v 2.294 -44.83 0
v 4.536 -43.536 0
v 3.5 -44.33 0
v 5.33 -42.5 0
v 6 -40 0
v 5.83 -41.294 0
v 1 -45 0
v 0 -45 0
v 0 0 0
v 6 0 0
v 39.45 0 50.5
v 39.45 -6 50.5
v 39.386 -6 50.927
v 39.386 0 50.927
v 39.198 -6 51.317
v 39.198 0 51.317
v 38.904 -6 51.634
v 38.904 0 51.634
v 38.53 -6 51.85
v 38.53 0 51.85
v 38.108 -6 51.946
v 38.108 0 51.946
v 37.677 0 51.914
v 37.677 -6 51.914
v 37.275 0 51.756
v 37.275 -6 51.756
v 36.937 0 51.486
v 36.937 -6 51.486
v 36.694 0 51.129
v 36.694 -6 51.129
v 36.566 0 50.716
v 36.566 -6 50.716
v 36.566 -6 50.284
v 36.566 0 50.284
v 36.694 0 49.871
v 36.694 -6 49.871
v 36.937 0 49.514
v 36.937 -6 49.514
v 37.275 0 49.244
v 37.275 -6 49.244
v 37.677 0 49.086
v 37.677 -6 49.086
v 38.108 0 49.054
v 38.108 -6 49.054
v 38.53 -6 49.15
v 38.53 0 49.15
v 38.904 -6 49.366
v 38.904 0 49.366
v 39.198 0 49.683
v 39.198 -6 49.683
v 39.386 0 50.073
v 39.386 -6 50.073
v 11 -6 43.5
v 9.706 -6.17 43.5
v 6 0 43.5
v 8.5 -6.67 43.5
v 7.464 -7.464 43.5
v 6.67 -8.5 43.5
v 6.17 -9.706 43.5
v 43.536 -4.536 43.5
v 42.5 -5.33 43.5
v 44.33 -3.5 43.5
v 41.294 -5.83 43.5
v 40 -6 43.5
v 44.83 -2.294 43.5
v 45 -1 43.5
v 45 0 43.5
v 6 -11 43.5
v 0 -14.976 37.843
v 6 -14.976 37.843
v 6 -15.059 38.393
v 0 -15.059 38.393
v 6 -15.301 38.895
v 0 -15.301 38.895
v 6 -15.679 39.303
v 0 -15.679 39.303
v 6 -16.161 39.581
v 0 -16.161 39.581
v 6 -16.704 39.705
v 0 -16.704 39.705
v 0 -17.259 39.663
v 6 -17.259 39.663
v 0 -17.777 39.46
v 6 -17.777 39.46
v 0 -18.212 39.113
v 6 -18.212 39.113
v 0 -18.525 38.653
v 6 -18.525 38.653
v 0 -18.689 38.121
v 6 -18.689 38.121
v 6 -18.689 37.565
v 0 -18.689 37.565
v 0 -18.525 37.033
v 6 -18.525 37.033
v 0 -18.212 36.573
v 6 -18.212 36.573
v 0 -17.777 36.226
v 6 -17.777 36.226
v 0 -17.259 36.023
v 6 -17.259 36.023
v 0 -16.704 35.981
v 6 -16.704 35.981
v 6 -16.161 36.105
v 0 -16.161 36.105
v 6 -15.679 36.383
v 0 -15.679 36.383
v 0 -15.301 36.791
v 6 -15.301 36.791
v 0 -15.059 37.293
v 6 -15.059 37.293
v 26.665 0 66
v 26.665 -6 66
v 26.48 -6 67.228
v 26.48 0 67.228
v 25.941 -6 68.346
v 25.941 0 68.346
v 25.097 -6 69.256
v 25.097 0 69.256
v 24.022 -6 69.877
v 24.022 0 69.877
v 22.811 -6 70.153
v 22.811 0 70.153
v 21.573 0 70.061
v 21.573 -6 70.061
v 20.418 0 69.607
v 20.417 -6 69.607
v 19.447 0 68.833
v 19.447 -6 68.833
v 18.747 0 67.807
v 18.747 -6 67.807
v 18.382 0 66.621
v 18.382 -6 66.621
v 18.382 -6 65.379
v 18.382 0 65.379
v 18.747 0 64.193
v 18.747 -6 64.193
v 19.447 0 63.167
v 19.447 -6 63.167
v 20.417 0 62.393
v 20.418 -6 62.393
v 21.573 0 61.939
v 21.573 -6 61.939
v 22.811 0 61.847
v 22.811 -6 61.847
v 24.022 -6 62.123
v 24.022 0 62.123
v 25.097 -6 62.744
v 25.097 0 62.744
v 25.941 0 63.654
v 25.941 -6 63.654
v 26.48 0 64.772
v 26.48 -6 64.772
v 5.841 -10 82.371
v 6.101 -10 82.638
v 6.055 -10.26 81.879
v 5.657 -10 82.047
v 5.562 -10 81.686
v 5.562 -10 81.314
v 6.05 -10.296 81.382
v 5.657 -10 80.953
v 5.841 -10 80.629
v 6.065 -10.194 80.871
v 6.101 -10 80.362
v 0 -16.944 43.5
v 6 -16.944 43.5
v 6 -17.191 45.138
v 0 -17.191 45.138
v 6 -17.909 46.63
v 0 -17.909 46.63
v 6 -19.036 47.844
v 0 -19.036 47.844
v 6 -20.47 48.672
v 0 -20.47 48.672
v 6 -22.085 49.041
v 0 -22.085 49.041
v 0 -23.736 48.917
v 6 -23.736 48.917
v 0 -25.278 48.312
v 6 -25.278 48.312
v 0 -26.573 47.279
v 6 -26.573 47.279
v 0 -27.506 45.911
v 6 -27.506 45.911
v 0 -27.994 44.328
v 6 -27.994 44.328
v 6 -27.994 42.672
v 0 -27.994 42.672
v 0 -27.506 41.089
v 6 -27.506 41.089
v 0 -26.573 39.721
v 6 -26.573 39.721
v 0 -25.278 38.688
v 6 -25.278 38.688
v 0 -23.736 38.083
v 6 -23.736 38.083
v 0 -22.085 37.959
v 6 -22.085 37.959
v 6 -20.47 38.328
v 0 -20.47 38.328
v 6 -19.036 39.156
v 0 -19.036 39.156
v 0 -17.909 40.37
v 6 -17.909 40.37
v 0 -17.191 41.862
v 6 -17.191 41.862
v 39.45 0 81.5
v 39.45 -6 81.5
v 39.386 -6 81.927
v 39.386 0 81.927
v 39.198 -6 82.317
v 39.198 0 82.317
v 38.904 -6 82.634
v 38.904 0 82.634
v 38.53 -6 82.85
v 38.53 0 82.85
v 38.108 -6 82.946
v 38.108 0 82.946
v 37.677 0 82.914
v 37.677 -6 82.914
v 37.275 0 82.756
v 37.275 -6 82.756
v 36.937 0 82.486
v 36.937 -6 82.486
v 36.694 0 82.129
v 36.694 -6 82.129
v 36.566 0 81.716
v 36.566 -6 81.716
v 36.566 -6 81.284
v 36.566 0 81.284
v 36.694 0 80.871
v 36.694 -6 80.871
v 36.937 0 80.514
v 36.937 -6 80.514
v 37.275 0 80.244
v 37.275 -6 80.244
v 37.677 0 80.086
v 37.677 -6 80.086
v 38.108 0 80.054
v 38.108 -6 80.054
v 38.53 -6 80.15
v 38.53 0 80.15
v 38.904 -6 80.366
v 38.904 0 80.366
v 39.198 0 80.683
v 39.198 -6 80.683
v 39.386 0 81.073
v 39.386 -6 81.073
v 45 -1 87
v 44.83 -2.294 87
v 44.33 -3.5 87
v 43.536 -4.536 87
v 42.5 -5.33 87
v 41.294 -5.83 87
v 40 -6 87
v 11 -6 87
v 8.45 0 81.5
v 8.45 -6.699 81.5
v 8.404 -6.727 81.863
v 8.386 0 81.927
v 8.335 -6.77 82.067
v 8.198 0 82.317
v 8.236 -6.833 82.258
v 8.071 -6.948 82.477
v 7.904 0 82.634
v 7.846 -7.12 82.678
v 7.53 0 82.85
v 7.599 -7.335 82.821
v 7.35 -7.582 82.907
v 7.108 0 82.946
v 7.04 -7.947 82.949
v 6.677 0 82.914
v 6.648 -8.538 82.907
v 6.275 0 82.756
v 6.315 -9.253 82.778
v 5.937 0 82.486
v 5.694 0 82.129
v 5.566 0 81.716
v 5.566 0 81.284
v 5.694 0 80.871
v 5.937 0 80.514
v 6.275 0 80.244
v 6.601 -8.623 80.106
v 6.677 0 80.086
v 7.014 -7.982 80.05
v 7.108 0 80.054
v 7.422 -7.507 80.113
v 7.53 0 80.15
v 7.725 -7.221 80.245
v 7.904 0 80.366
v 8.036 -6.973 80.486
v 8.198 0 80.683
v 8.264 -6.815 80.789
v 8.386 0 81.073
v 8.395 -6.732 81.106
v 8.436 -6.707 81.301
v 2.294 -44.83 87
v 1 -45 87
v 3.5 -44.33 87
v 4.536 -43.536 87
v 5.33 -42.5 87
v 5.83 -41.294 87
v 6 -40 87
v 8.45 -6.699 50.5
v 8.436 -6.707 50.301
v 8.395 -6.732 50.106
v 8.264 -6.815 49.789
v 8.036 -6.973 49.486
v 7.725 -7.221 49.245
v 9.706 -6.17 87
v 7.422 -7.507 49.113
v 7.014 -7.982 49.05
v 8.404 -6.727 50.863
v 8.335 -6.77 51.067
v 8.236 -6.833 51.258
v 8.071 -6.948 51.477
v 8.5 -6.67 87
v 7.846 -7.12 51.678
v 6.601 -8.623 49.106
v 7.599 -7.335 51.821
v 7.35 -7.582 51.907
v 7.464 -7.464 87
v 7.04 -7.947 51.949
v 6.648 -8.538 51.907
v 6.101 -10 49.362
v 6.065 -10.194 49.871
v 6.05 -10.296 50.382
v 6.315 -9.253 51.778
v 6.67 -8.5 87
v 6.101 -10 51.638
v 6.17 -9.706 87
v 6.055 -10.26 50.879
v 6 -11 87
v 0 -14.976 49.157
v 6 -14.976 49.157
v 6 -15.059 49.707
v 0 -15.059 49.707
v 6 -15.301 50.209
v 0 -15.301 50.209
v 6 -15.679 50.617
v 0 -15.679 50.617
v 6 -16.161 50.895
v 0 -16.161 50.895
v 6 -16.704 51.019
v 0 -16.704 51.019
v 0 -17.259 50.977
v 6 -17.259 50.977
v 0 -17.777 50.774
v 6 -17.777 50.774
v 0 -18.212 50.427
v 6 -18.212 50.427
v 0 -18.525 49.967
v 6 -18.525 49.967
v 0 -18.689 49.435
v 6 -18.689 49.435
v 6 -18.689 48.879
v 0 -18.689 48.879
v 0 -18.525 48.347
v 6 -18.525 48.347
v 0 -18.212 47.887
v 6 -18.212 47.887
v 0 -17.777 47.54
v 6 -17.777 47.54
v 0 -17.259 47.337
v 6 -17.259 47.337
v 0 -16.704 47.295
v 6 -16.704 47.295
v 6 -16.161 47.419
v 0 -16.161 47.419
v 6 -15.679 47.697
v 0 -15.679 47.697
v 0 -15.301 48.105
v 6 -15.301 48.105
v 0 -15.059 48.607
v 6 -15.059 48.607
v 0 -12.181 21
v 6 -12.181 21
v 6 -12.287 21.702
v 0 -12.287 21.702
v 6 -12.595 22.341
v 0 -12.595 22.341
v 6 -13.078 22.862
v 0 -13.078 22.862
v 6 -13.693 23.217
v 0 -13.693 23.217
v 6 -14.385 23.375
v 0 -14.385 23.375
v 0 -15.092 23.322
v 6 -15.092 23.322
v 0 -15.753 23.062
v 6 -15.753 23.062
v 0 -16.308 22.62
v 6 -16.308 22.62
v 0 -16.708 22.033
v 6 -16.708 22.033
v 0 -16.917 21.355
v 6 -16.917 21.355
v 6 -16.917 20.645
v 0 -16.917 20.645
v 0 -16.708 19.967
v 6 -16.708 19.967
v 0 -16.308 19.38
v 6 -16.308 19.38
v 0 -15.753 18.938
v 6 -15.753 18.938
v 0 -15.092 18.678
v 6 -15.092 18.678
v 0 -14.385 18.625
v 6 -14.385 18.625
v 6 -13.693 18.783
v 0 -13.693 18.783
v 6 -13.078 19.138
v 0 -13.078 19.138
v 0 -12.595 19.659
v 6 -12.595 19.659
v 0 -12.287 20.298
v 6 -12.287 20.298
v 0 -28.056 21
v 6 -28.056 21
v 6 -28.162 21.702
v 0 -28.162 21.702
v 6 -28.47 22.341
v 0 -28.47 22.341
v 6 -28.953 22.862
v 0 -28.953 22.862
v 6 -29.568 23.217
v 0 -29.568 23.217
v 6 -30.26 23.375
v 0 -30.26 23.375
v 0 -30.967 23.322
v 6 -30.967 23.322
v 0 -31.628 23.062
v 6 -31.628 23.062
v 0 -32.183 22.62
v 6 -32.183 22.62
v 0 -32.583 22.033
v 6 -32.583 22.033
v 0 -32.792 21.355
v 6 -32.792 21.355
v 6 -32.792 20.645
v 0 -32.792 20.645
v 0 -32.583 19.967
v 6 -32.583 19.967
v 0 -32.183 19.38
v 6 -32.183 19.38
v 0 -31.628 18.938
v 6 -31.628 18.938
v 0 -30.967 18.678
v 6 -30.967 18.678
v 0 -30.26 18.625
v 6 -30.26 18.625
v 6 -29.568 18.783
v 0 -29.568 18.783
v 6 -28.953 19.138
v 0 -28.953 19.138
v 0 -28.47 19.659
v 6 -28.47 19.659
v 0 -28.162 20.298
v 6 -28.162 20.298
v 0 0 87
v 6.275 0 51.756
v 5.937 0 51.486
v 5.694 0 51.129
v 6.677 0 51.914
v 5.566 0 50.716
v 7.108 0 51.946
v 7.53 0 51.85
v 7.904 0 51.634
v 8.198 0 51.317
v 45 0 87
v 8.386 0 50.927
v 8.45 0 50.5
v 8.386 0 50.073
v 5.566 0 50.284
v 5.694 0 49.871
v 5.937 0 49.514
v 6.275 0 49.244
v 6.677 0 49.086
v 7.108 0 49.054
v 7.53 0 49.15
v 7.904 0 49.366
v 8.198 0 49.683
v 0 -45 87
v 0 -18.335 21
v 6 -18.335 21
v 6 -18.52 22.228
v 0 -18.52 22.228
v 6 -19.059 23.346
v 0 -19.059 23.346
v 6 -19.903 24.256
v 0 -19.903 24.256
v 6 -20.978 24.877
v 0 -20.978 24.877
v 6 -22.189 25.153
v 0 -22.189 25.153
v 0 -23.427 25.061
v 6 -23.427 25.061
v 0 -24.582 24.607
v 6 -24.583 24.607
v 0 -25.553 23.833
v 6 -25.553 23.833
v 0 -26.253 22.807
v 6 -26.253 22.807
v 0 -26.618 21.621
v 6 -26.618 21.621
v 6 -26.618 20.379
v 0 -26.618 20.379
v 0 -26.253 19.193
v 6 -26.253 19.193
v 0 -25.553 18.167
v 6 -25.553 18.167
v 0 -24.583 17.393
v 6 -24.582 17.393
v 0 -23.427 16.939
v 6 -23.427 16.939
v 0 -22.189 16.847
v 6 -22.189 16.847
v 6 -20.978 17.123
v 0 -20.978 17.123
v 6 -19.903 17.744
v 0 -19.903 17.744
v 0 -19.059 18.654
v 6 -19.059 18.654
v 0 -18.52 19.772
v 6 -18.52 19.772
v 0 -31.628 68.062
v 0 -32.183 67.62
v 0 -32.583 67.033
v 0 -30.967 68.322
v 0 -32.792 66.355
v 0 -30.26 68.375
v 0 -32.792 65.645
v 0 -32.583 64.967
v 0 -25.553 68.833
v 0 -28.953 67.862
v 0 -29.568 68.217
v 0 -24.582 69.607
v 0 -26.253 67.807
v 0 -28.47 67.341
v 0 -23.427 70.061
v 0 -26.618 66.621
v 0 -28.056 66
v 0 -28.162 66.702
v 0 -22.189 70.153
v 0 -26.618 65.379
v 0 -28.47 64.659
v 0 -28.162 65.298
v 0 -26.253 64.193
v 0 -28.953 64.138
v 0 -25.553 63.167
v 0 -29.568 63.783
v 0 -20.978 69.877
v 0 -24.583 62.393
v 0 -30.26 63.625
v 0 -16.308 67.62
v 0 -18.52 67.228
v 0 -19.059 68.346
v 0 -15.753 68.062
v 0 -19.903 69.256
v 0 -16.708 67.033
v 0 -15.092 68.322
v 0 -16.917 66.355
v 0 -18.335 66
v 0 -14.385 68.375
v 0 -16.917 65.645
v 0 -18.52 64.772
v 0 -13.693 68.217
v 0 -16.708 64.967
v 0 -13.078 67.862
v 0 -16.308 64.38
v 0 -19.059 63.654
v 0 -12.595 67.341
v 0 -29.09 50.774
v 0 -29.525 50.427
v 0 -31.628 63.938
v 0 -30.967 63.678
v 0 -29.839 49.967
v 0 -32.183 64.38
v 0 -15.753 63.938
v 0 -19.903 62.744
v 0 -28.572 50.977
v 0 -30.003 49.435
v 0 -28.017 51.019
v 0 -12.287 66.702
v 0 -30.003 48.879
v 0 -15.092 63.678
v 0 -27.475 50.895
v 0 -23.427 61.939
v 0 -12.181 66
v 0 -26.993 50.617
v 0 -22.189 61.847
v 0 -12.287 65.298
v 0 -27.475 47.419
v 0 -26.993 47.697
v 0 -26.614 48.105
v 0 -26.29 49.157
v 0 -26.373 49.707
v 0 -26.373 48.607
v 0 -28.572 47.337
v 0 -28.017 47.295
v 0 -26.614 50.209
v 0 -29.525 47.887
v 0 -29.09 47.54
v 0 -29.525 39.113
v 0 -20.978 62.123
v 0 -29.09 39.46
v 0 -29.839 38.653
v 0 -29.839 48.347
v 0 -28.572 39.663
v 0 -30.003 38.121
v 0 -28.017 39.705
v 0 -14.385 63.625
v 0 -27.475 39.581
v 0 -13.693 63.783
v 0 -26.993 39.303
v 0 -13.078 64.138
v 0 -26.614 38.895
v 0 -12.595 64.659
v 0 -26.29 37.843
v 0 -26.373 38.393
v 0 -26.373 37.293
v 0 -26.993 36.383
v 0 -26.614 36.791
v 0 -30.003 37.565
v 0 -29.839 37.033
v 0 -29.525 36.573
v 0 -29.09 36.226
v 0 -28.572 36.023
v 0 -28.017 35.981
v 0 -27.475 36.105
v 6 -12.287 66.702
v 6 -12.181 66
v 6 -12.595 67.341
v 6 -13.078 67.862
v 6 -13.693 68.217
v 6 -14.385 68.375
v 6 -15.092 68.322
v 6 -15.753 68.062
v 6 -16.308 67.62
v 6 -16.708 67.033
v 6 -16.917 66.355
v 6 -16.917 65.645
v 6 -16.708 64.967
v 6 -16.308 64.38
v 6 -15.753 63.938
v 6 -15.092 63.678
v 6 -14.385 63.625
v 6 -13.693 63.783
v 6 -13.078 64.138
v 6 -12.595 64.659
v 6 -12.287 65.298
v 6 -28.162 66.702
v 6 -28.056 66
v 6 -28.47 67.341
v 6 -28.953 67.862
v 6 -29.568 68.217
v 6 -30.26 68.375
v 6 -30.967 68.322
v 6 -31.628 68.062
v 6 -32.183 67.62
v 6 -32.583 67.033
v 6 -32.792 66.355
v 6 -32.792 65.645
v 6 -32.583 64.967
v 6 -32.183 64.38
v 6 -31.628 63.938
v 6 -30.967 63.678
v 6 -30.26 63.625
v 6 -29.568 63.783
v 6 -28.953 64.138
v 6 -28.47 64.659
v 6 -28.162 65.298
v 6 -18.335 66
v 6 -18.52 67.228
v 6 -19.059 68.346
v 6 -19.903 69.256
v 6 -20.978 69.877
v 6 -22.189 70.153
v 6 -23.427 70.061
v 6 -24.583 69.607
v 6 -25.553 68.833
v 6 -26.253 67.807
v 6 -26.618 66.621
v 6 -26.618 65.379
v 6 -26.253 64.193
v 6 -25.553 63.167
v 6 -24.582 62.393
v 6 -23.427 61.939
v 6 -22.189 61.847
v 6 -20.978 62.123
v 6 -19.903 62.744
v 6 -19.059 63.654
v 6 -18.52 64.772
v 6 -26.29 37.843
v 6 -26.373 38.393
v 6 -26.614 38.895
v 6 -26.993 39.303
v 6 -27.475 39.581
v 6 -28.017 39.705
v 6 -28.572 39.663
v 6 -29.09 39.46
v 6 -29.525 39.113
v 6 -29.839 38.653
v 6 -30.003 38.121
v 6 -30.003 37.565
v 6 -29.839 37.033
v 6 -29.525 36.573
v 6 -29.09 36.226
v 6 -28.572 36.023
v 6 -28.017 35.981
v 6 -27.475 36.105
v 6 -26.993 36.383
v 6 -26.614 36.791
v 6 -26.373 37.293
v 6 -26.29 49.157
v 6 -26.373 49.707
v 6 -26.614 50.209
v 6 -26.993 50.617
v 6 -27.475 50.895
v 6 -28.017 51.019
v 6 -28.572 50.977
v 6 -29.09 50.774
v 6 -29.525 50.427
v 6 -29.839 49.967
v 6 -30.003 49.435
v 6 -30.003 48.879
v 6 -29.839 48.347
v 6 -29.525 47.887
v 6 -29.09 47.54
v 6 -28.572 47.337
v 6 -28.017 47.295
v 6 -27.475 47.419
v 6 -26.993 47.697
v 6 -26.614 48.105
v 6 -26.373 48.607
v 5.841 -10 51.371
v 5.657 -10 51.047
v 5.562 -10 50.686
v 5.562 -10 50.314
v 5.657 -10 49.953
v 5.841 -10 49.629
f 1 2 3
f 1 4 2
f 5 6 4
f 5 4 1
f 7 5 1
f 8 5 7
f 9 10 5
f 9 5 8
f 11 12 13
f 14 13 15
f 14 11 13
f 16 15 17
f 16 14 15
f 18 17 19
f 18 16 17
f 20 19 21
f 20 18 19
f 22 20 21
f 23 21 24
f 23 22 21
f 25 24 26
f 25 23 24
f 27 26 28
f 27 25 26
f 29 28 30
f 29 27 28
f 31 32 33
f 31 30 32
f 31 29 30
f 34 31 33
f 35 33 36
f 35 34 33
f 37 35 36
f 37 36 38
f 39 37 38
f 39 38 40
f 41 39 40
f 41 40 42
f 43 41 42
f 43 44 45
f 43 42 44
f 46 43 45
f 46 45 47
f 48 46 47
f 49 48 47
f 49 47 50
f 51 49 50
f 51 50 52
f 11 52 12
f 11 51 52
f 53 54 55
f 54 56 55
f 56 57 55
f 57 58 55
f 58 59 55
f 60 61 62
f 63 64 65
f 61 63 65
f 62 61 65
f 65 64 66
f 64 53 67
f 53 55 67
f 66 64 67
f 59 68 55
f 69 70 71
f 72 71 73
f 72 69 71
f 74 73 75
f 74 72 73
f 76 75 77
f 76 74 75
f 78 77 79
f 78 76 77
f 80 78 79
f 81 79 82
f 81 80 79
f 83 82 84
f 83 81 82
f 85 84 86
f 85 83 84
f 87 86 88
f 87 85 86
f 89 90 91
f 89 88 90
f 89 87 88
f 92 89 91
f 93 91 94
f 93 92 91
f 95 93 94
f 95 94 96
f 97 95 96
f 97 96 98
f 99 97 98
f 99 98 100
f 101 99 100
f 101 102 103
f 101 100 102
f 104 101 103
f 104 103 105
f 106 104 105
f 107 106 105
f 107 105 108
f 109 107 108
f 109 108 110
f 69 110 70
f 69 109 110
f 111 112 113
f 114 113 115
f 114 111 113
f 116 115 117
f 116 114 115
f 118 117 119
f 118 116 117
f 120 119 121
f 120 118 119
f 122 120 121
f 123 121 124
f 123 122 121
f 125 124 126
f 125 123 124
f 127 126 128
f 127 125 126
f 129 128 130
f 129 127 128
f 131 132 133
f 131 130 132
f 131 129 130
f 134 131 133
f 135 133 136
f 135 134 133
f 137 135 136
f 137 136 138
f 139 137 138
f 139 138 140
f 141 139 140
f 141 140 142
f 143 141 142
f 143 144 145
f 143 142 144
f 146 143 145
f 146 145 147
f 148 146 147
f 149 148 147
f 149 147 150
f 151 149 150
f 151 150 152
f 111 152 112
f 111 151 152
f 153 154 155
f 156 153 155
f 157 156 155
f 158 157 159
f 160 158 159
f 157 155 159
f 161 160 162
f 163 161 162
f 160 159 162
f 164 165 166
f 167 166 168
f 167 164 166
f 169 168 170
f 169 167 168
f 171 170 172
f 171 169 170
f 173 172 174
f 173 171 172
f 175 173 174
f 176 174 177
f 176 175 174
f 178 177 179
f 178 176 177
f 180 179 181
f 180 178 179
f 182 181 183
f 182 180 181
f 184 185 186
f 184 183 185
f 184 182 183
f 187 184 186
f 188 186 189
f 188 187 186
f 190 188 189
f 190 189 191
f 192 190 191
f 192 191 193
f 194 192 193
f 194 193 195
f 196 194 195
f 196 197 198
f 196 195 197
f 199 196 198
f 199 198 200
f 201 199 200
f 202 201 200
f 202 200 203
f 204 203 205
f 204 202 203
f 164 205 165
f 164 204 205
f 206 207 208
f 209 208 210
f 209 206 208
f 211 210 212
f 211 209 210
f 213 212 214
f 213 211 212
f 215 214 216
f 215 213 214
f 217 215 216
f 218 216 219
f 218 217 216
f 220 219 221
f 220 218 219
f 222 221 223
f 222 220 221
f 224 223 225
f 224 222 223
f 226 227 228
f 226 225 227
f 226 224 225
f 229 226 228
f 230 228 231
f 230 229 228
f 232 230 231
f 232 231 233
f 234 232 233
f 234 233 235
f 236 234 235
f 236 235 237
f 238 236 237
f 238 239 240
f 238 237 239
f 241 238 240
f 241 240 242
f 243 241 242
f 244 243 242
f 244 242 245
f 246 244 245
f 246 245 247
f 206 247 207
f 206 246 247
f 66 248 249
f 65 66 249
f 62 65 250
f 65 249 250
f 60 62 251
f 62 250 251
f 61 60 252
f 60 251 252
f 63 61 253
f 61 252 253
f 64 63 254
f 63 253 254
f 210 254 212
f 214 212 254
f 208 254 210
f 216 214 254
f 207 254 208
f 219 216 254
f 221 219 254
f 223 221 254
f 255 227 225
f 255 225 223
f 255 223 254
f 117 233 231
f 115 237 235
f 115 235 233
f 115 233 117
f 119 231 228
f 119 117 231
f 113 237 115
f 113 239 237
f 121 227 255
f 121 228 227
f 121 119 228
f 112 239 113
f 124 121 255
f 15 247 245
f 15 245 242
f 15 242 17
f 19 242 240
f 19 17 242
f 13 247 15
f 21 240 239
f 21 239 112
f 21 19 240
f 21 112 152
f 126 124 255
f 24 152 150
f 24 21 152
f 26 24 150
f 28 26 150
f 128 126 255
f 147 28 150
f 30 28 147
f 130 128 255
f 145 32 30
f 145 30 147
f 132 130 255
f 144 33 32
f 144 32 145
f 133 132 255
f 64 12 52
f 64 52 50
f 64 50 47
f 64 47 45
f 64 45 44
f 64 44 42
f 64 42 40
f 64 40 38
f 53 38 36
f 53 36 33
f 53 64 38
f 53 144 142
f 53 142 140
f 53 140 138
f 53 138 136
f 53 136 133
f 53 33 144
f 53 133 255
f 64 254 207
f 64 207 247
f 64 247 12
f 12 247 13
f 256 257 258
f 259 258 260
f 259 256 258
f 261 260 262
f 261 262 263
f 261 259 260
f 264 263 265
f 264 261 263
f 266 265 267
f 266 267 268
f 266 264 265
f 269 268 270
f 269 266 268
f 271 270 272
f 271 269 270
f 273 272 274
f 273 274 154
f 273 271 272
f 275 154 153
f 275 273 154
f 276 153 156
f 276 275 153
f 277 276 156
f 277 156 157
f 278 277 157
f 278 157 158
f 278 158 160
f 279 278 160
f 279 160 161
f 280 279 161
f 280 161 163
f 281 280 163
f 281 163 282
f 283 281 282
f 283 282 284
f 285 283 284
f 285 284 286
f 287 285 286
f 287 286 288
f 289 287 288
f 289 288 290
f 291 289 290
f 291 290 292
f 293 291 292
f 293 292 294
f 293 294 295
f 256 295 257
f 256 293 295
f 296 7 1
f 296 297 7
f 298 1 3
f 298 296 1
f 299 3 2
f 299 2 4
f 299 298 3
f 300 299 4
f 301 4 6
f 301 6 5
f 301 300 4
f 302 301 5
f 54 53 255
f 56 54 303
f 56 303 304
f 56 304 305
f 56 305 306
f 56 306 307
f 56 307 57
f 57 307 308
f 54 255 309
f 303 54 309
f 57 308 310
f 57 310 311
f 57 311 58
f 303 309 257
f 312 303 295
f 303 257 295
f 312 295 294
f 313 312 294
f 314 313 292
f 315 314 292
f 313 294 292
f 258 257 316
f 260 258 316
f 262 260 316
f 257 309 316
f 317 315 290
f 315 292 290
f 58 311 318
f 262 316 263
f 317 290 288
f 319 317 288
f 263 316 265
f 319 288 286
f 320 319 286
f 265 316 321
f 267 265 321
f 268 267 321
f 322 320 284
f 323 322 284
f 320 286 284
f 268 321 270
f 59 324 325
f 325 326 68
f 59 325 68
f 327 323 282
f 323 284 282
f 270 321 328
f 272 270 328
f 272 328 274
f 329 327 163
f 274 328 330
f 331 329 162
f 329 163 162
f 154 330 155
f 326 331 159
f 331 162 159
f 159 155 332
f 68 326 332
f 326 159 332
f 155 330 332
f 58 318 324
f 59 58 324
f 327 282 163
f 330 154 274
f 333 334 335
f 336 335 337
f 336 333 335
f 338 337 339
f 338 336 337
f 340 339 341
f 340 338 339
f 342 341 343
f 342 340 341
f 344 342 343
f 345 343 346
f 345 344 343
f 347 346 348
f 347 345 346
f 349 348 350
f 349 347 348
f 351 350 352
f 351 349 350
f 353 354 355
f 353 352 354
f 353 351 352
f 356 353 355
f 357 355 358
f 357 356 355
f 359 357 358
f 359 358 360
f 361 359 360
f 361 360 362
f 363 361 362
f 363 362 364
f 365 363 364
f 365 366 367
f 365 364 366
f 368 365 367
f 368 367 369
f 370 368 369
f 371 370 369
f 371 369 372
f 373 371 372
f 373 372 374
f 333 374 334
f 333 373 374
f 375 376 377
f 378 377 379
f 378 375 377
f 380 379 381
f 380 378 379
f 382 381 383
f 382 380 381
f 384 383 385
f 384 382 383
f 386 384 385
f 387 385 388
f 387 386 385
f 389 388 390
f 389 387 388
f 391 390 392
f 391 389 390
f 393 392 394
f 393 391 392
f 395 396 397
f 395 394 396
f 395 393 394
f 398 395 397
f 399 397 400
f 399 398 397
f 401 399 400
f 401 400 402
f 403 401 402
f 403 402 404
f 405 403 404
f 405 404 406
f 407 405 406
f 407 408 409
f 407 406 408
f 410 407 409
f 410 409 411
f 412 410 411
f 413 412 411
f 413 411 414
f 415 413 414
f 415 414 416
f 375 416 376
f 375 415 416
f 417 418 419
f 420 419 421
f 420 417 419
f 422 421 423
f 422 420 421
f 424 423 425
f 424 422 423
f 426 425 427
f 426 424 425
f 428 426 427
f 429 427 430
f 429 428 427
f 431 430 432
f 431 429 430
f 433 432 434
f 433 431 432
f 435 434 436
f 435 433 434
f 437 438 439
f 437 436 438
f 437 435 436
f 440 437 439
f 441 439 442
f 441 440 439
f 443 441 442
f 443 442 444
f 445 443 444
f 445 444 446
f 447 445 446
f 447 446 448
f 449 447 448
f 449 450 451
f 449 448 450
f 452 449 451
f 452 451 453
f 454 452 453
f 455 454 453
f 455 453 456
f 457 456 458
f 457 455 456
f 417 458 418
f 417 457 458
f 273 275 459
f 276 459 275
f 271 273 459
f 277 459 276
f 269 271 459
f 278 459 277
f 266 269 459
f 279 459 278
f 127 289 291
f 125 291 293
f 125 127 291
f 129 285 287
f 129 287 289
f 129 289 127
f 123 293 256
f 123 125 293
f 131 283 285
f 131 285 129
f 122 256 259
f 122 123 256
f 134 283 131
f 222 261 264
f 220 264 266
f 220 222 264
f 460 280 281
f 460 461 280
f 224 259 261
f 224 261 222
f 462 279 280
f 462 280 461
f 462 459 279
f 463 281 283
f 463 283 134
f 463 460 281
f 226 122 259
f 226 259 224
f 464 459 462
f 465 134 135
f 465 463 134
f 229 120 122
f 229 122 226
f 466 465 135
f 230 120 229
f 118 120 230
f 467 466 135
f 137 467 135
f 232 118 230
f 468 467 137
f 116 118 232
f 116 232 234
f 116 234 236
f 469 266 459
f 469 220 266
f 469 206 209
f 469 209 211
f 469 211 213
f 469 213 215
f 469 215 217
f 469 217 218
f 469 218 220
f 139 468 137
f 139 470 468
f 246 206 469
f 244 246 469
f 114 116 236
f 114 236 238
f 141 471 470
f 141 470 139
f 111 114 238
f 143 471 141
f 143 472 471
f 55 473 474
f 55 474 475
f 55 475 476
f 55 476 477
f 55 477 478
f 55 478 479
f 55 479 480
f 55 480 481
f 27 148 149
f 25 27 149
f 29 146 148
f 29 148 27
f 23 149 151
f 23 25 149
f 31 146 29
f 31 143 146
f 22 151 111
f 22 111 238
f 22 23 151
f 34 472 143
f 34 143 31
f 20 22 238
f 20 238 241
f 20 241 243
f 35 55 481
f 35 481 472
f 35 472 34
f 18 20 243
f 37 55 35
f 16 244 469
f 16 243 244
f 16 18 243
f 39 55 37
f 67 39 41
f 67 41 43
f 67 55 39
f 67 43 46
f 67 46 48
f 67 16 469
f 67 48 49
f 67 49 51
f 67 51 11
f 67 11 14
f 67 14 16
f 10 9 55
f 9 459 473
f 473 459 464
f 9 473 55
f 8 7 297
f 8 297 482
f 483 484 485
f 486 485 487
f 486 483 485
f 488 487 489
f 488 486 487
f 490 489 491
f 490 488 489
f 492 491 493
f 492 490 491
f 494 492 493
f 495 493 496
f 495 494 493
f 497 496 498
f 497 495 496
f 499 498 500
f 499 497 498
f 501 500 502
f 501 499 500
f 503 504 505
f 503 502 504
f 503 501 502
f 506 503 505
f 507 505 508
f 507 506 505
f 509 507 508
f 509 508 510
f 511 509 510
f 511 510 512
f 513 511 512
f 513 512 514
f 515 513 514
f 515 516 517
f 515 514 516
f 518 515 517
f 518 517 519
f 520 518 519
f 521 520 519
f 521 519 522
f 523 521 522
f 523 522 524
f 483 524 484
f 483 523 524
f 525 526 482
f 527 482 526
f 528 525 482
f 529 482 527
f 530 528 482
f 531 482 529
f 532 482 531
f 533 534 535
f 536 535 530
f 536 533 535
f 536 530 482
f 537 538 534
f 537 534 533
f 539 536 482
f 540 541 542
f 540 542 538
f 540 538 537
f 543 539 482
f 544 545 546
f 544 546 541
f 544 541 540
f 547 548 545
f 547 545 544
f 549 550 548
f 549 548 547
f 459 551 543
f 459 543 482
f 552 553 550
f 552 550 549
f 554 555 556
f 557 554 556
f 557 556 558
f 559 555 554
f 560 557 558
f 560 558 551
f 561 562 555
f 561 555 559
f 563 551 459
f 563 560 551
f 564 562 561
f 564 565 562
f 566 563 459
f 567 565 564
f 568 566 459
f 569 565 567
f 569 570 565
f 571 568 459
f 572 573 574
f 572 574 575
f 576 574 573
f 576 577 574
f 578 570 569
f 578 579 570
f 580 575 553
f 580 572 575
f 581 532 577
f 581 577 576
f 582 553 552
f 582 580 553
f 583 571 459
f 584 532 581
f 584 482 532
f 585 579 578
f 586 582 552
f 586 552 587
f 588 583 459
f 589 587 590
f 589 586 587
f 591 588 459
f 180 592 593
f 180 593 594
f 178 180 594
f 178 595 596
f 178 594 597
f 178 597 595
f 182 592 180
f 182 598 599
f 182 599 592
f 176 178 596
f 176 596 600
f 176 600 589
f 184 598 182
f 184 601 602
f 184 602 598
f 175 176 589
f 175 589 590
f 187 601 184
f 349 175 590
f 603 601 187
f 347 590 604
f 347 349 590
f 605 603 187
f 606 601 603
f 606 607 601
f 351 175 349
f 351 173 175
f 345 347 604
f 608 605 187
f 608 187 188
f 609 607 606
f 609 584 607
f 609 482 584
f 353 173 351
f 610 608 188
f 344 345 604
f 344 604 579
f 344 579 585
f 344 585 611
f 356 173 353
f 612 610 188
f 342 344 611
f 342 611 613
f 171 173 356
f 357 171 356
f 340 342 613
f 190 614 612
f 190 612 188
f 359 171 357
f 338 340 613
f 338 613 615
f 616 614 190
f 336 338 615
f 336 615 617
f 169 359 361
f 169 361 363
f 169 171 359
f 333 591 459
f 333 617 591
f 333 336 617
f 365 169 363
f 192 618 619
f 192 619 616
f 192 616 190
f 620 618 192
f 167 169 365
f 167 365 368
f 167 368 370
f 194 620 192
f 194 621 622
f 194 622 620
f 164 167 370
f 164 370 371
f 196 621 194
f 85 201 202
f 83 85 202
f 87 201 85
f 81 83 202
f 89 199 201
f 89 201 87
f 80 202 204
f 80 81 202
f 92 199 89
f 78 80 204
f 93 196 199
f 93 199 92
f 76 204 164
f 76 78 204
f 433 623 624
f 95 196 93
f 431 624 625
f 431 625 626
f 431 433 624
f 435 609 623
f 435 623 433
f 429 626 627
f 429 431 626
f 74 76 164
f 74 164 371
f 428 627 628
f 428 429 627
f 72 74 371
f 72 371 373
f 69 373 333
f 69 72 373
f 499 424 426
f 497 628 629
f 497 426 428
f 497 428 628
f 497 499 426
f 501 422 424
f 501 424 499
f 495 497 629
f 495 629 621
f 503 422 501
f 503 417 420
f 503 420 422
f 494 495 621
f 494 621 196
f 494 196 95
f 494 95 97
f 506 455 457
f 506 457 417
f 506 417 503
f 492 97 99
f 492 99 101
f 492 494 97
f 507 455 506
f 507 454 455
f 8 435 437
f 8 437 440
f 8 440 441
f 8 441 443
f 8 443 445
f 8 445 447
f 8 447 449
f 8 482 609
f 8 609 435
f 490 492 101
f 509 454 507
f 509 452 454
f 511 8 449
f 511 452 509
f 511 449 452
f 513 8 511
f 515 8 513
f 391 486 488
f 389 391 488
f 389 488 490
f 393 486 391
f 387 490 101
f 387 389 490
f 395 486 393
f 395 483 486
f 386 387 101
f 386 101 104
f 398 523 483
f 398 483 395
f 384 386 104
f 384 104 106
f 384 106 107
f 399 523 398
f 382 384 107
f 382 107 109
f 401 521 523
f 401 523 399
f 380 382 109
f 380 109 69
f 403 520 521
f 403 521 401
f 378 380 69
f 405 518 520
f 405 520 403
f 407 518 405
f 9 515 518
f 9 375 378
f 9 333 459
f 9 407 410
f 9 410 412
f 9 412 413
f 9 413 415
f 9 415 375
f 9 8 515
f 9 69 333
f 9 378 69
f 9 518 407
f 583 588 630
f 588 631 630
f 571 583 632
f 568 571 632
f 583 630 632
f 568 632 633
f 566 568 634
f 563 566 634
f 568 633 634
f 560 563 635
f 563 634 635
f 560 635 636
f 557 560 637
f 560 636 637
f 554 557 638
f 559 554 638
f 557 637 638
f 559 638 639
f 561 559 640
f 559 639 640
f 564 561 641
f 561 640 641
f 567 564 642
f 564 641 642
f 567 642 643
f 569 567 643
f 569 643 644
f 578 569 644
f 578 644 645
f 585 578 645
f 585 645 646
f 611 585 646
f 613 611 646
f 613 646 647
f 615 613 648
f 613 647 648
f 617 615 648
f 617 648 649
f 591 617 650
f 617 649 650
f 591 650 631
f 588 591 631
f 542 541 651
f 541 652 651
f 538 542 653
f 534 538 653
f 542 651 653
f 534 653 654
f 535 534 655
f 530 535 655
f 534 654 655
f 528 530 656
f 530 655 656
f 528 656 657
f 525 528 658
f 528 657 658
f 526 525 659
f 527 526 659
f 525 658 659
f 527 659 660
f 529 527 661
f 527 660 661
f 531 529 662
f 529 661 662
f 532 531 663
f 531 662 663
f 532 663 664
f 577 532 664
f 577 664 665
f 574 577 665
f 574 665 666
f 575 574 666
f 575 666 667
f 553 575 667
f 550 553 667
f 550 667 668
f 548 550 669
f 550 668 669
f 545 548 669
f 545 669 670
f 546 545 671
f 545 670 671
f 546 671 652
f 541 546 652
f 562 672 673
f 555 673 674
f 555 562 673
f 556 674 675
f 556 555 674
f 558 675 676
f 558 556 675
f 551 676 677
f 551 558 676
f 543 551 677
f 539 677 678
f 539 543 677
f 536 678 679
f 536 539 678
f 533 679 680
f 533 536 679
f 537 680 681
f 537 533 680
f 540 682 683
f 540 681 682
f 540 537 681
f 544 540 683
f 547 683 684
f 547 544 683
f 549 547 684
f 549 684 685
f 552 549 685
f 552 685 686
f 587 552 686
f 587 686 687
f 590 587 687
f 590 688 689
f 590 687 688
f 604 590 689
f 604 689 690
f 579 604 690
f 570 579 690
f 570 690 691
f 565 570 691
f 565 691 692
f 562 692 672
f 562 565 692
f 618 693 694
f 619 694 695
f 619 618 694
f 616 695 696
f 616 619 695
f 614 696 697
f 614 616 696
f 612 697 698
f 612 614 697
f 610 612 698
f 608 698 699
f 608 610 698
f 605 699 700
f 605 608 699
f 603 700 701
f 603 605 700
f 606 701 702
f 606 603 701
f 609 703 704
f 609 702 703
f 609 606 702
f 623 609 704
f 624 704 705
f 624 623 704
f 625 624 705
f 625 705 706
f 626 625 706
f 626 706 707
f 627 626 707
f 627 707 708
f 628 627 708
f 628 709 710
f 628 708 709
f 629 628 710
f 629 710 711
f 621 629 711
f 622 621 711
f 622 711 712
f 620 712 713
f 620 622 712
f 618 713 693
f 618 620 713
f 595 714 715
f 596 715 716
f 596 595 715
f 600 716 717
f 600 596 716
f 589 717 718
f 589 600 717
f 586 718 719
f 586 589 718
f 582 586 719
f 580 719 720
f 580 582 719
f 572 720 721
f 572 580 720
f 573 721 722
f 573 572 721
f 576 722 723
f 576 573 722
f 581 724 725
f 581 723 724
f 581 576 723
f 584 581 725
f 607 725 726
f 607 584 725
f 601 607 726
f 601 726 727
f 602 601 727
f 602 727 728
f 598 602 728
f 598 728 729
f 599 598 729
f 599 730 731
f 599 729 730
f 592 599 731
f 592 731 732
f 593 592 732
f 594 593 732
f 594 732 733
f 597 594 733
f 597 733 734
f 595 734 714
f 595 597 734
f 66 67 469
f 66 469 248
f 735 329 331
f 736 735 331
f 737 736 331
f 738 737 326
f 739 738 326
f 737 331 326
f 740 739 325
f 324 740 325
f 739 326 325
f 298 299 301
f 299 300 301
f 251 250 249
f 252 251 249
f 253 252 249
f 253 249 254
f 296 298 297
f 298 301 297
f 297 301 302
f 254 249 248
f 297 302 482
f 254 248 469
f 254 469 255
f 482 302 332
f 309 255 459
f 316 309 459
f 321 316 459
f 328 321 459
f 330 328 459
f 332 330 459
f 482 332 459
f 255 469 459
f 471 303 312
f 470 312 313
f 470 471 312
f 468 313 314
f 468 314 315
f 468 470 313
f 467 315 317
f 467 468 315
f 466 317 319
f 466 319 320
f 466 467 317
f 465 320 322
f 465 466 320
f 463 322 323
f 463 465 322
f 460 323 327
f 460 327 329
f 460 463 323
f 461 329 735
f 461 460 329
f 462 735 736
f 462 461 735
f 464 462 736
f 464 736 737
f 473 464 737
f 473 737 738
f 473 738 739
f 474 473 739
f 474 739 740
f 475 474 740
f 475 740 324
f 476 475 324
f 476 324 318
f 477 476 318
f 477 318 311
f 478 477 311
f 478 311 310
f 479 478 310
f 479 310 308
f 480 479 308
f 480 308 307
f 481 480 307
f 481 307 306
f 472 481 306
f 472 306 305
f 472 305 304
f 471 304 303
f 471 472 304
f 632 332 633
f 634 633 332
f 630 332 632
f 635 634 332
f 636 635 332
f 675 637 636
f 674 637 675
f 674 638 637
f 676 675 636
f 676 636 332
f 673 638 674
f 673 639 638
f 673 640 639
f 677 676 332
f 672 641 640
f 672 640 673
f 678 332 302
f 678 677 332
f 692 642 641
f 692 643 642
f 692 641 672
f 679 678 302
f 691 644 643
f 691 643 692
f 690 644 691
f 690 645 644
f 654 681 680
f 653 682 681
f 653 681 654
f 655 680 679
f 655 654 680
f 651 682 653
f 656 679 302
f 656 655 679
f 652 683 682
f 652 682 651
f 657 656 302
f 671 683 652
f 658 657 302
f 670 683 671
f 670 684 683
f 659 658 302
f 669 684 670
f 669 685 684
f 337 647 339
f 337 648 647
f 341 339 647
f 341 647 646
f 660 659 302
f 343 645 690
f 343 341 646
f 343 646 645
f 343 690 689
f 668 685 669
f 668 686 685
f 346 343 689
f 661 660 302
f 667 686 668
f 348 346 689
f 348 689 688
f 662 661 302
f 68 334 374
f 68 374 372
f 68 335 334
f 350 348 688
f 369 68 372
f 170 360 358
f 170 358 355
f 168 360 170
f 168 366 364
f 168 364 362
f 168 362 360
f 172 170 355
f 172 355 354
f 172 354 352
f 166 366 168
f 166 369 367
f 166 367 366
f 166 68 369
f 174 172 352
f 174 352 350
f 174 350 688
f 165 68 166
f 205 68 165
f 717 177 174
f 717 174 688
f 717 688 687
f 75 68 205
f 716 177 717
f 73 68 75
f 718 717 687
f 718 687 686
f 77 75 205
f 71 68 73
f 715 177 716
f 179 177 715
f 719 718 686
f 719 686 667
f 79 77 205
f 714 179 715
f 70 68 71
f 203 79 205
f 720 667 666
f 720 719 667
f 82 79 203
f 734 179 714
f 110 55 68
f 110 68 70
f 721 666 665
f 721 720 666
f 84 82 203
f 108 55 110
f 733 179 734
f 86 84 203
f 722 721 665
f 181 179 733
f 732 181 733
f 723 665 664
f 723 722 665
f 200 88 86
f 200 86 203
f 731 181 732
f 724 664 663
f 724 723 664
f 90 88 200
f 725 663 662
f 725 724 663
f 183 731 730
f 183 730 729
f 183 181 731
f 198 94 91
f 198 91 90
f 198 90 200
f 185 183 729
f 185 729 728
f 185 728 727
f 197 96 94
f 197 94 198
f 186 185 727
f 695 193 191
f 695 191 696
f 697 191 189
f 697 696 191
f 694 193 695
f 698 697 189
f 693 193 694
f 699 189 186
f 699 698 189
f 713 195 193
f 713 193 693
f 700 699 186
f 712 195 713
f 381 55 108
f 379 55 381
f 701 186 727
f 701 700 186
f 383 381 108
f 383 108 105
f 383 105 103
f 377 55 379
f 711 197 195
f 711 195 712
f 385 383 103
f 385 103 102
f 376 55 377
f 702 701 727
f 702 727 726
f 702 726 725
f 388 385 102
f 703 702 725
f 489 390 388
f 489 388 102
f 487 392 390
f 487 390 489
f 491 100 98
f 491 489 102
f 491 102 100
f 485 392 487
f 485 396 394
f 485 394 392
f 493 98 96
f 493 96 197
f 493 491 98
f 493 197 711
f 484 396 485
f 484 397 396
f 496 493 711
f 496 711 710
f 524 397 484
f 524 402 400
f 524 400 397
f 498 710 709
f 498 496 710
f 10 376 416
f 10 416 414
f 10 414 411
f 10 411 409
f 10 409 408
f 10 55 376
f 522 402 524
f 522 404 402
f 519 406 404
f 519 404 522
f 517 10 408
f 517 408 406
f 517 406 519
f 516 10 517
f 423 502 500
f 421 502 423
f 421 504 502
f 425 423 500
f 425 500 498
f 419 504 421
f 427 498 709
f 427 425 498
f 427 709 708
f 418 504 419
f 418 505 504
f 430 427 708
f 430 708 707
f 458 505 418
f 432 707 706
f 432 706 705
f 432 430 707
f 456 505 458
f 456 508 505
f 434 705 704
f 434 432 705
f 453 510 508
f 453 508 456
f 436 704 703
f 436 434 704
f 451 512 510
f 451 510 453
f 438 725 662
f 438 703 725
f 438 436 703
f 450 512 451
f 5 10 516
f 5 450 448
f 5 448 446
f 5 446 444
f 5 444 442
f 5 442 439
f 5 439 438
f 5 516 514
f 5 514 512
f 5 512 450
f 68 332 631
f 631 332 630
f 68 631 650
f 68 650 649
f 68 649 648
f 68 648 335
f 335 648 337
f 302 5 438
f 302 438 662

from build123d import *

# Parameters (mm, degrees)
PAD_DEPTH            = 87
SKETCH001_R          = 4.165
POCKET_DEPTH         = 0.001
POCKET_DEPTH_BACK    = 45.001
SKETCH002_R          = 4.165
POCKET001_DEPTH      = 0.001
POCKET001_DEPTH_BACK = 45.001
FILLET_R             = 5
SKETCH004_R          = 2.38125
POCKET002_DEPTH      = 0.001
POCKET002_DEPTH_BACK = 45.001
LINEARPATTERN_COUNT  = 2
LINEARPATTERN_PITCH  = 45
SKETCH005_R          = 5.55625
SKETCH005_R_2        = 1.867
POCKET003_DEPTH      = 0.001
POCKET003_DEPTH_BACK = 45.001
SKETCH006_R          = 1.45
HOLE_DEPTH           = 10
HOLE_TIPS_R          = 1.45
SKETCH007_W          = 60
SKETCH007_H          = 60
POCKET004_DEPTH      = 43.5


with BuildPart() as part:
    # Sketch → Pad (new body)
    with BuildSketch(Plane.XY):
        Polygon((0, 0), (45, 0), (45, -6), (6, -6), (6, -45), (0, -45), align=None)
    extrude(amount=PAD_DEPTH)

    # Sketch001 → Pocket (cut, two sides)
    with BuildSketch(Plane.YZ) as pocket_sk:
        with Locations((-22.5, 21)):
            Circle(SKETCH001_R)
        with Locations((-22.5, 66)):
            Circle(SKETCH001_R)
    extrude(amount=-POCKET_DEPTH, mode=Mode.SUBTRACT)
    extrude(pocket_sk.sketch, amount=POCKET_DEPTH_BACK, mode=Mode.SUBTRACT)

    # Sketch002 → Pocket001 (cut, two sides)
    with BuildSketch(Plane.XZ) as pocket001_sk:
        with Locations((22.5, 66)):
            Circle(SKETCH002_R)
        with Locations((22.5, 21)):
            Circle(SKETCH002_R)
    extrude(amount=-POCKET001_DEPTH, mode=Mode.SUBTRACT)
    extrude(pocket001_sk.sketch, amount=POCKET001_DEPTH_BACK, mode=Mode.SUBTRACT)

    # Fillet
    fillet_edges = [part.edges().sort_by_distance(p)[0] for p in [
        (6, -45, 43.5),
        (45, -6, 43.5),
        (6, -6, 43.5),
    ]]
    fillet(fillet_edges, radius=FILLET_R)

    # Sketch004 → Pocket002 (cut, two sides)
    with BuildSketch(Plane.YZ) as pocket002_sk:
        with Locations((-14.5625, 21)):
            Circle(SKETCH004_R)
        with Locations((-30.4375, 21)):
            Circle(SKETCH004_R)
    pocket002 = extrude(amount=-POCKET002_DEPTH, mode=Mode.SUBTRACT) + extrude(pocket002_sk.sketch, amount=POCKET002_DEPTH_BACK, mode=Mode.SUBTRACT)

    # LinearPattern: Pocket002 ×2
    with Locations(*[(0, 0, i * LINEARPATTERN_PITCH) for i in range(1, LINEARPATTERN_COUNT)]):
        add(pocket002, mode=Mode.SUBTRACT)

    # Sketch005 → Pocket003 (cut, two sides)
    with BuildSketch(Plane.YZ) as pocket003_sk:
        with Locations((-22.5, 43.5)):
            Circle(SKETCH005_R)
        with Locations((-28.156854, 49.156854)):
            Circle(SKETCH005_R_2)
        with Locations((-16.843146, 37.843146)):
            Circle(SKETCH005_R_2)
        with Locations((-16.843146, 49.156854)):
            Circle(SKETCH005_R_2)
        with Locations((-28.156854, 37.843146)):
            Circle(SKETCH005_R_2)
    extrude(amount=-POCKET003_DEPTH, mode=Mode.SUBTRACT)
    extrude(pocket003_sk.sketch, amount=POCKET003_DEPTH_BACK, mode=Mode.SUBTRACT)

    # Sketch006 → Hole (cut)
    with BuildSketch(Plane.XZ):
        with Locations((7, 81.5)):
            Circle(SKETCH006_R)
        with Locations((38, 81.5)):
            Circle(SKETCH006_R)
        with Locations((38, 50.5)):
            Circle(SKETCH006_R)
        with Locations((7, 50.5)):
            Circle(SKETCH006_R)
    extrude(amount=HOLE_DEPTH, mode=Mode.SUBTRACT)

    # Hole tips → Hole tip 1 section 0
    with BuildSketch(Plane.XZ.offset(10), mode=Mode.PRIVATE) as hole_tip_1_s0:
        with Locations((7, 81.5)):
            Circle(HOLE_TIPS_R)
    loft([hole_tip_1_s0.sketch, Vertex(7, -10.871248, 81.5)], mode=Mode.SUBTRACT)

    # Hole tips → Hole tip 2 section 0
    with BuildSketch(Plane.XZ.offset(10), mode=Mode.PRIVATE) as hole_tip_2_s0:
        with Locations((38, 81.5)):
            Circle(HOLE_TIPS_R)
    loft([hole_tip_2_s0.sketch, Vertex(38, -10.871248, 81.5)], mode=Mode.SUBTRACT)

    # Hole tips → Hole tip 3 section 0
    with BuildSketch(Plane.XZ.offset(10), mode=Mode.PRIVATE) as hole_tip_3_s0:
        with Locations((38, 50.5)):
            Circle(HOLE_TIPS_R)
    loft([hole_tip_3_s0.sketch, Vertex(38, -10.871248, 50.5)], mode=Mode.SUBTRACT)

    # Hole tips → Hole tip 4 section 0
    with BuildSketch(Plane.XZ.offset(10), mode=Mode.PRIVATE) as hole_tip_4_s0:
        with Locations((7, 50.5)):
            Circle(HOLE_TIPS_R)
    loft([hole_tip_4_s0.sketch, Vertex(7, -10.871248, 50.5)], mode=Mode.SUBTRACT)

    # Sketch007 → Pocket004 (cut)
    with BuildSketch(Plane.XY):
        with Locations((36, 0)):
            Rectangle(SKETCH007_W, SKETCH007_H)
    extrude(amount=POCKET004_DEPTH, mode=Mode.SUBTRACT)


solid = part.part
